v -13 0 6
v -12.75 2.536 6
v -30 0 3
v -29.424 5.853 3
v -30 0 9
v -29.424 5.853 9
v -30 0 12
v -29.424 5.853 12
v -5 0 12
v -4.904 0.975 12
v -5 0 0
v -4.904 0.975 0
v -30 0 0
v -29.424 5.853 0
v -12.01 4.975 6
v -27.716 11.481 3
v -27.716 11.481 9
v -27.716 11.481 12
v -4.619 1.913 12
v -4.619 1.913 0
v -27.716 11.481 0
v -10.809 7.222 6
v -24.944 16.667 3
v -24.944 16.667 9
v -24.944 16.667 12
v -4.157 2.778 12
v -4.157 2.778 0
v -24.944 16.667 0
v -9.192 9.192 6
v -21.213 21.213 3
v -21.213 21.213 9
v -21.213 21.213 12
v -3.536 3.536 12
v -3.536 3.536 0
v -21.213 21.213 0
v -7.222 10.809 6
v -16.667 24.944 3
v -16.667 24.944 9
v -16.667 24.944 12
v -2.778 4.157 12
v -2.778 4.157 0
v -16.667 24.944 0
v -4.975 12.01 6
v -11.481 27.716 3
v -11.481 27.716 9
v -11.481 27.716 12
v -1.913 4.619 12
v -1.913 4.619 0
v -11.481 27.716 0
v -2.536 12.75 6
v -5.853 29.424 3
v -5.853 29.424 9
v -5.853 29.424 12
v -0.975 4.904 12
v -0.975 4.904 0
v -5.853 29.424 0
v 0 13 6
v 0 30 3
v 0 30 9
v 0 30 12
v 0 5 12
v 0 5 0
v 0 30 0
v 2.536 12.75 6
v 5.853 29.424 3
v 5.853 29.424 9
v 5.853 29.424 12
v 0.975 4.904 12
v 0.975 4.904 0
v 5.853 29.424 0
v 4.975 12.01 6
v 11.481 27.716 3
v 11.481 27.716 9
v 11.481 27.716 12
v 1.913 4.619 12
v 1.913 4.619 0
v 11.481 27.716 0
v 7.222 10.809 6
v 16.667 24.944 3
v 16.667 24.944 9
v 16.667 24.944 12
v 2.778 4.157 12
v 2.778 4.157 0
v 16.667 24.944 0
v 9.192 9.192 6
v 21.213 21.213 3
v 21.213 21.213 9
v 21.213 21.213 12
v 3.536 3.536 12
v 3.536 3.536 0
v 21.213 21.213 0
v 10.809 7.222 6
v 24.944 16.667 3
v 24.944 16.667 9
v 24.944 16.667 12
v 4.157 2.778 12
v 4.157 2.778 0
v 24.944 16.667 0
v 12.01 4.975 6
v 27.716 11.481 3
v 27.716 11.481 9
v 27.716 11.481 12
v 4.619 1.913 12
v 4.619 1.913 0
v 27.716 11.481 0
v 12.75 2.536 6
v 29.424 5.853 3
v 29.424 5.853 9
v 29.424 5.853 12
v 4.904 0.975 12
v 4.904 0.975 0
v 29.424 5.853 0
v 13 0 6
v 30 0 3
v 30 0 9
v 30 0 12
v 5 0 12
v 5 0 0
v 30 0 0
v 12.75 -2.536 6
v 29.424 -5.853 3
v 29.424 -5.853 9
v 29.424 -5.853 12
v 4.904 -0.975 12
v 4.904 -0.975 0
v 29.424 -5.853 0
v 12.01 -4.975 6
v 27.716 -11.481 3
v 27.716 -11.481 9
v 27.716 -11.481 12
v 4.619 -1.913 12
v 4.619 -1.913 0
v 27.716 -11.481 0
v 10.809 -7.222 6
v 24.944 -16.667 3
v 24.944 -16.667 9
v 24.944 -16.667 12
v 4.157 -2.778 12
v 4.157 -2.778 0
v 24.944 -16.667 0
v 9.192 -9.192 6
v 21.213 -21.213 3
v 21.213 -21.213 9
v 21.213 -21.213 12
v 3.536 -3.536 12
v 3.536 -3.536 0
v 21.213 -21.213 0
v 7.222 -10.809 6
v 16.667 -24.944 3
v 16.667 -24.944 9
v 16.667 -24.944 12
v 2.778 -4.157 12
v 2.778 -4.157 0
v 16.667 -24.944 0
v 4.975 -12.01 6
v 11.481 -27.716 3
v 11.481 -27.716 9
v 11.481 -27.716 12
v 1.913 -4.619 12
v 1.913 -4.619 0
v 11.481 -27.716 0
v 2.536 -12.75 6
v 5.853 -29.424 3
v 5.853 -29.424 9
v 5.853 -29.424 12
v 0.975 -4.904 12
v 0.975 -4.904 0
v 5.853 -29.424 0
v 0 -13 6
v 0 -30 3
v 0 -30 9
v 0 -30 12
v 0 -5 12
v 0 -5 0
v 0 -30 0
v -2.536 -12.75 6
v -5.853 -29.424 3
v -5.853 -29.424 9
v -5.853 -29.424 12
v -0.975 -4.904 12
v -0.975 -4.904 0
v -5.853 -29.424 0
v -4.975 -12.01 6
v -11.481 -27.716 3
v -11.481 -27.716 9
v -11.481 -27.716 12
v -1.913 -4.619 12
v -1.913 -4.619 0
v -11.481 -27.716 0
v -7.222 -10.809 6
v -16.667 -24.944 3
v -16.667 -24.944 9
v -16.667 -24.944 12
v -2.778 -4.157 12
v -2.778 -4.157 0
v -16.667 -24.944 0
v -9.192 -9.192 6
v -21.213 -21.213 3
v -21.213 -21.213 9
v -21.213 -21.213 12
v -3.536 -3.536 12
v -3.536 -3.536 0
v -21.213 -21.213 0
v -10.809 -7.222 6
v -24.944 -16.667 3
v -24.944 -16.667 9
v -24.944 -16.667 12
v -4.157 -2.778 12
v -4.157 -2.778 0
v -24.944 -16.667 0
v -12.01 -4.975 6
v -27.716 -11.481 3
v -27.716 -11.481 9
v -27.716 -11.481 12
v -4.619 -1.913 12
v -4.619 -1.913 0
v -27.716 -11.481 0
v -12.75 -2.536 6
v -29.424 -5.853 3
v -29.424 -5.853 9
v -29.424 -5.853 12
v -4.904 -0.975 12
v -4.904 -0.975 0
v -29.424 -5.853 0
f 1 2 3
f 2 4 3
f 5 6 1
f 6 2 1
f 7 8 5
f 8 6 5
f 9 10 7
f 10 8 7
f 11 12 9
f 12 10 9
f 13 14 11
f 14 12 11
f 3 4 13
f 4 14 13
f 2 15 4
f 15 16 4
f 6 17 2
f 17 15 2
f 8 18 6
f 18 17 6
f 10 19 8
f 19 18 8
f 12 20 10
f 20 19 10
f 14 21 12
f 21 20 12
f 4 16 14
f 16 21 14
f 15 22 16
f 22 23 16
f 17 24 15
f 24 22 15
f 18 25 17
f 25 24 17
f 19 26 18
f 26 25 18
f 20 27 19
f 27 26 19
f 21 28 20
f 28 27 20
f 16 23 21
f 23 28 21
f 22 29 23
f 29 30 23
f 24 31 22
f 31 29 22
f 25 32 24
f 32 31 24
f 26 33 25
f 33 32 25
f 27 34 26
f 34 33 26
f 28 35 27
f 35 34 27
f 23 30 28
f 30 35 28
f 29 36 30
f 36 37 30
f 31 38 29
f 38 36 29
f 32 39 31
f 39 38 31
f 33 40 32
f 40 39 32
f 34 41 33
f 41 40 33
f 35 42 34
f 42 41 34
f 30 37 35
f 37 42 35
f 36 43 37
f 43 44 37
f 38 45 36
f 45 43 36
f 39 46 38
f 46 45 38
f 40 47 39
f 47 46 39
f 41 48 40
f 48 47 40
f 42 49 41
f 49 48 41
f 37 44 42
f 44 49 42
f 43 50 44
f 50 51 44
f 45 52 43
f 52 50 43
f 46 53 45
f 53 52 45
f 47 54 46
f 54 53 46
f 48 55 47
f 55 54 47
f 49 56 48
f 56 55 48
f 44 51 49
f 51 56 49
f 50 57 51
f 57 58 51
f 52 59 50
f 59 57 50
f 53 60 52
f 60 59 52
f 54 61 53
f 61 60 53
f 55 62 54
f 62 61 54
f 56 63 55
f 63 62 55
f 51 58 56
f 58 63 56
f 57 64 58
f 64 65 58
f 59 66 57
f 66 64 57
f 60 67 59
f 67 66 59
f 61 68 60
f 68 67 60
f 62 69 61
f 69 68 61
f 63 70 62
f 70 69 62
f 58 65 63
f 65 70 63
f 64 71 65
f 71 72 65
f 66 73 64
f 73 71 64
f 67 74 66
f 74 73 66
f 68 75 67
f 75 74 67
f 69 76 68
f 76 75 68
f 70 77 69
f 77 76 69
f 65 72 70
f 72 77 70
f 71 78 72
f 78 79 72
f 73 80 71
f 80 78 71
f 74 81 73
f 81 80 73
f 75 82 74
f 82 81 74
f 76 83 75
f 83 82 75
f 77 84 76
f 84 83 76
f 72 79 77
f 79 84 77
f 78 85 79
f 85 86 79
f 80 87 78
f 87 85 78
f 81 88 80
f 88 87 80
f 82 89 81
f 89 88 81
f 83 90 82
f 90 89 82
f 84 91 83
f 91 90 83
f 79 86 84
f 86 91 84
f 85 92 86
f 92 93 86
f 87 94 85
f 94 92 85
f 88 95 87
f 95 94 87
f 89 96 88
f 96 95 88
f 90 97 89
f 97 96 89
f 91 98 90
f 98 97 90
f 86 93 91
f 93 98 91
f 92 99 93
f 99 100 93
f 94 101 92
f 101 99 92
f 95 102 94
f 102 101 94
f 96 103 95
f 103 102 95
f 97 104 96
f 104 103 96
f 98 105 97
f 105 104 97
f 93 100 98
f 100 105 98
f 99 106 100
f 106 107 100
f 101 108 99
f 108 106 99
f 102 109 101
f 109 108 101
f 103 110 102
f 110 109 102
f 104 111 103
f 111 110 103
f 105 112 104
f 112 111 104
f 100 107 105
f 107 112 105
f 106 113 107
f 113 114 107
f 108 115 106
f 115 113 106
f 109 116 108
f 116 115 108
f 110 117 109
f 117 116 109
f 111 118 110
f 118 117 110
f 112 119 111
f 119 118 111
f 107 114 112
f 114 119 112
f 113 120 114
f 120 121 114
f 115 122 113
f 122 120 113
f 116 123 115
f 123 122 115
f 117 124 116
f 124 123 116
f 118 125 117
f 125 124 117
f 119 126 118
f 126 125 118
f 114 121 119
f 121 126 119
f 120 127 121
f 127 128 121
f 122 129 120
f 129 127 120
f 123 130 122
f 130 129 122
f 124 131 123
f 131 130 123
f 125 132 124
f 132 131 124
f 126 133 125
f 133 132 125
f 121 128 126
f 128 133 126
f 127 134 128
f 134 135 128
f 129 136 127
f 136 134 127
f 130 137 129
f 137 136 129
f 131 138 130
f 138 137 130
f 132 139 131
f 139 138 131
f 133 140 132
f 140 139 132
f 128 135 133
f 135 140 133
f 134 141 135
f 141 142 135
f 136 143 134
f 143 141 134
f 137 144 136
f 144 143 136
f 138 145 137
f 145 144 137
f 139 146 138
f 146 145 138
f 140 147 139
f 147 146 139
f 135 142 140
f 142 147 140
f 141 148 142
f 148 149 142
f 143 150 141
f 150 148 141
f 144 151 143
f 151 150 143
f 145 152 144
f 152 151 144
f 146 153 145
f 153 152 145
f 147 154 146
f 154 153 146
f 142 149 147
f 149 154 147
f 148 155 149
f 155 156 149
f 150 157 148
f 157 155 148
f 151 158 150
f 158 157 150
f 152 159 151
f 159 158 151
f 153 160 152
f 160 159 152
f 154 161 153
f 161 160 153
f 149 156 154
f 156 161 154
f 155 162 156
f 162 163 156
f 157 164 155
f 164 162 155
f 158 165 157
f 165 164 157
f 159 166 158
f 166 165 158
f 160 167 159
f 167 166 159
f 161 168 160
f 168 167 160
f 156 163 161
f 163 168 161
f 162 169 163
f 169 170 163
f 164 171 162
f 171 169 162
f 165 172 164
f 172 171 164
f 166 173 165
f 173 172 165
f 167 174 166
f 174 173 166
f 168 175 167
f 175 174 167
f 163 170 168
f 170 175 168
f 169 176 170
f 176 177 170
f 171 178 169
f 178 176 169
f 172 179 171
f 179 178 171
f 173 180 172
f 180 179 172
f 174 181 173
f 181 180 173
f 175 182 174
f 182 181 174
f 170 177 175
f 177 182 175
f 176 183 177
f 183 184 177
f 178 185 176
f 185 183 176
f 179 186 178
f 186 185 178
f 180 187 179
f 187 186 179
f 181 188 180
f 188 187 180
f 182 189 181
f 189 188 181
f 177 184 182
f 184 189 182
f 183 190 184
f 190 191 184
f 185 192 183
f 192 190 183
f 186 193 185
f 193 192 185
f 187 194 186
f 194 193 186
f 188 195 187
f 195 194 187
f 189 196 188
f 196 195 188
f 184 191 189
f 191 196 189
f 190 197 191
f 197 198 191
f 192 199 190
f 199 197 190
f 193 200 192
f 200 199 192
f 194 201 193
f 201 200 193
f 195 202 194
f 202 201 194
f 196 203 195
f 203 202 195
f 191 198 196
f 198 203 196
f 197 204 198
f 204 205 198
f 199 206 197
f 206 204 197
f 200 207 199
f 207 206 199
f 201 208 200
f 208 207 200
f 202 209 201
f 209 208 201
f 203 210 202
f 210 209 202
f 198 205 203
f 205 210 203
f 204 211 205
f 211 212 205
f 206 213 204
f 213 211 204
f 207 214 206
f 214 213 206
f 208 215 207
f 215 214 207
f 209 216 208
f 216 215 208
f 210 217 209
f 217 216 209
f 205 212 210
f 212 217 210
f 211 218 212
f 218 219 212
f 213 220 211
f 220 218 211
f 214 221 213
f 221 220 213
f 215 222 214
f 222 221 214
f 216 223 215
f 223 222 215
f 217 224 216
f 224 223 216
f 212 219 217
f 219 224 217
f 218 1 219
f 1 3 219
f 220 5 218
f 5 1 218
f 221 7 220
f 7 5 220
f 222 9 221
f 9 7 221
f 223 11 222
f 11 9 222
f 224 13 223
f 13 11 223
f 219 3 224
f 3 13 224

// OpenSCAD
$fn = 32;

// ----------------------------------------------------------------------
// Revolved part: V-groove pulley R30
// ----------------------------------------------------------------------

// --- parameters (mm) ---
bore_r = 5;               // bore radius
rim_r = 30;               // rim radius
rim_t = 12;               // rim width
groove_r = 13;            // groove root radius
groove_w = 3;             // groove half width
revolve_angle = 360;      // revolve sweep, degrees

bore_d = 2 * bore_r;
rim_d = 2 * rim_r;
groove_d = 2 * groove_r;

profile = [[5, 0], [30, 0], [30, 3], [13, 6], [30, 9], [30, 12], [5, 12]];  // primary outline, 7 points, counter clockwise

// --- the one profile operation ---
rotate_extrude(angle = revolve_angle) polygon(points = profile);
